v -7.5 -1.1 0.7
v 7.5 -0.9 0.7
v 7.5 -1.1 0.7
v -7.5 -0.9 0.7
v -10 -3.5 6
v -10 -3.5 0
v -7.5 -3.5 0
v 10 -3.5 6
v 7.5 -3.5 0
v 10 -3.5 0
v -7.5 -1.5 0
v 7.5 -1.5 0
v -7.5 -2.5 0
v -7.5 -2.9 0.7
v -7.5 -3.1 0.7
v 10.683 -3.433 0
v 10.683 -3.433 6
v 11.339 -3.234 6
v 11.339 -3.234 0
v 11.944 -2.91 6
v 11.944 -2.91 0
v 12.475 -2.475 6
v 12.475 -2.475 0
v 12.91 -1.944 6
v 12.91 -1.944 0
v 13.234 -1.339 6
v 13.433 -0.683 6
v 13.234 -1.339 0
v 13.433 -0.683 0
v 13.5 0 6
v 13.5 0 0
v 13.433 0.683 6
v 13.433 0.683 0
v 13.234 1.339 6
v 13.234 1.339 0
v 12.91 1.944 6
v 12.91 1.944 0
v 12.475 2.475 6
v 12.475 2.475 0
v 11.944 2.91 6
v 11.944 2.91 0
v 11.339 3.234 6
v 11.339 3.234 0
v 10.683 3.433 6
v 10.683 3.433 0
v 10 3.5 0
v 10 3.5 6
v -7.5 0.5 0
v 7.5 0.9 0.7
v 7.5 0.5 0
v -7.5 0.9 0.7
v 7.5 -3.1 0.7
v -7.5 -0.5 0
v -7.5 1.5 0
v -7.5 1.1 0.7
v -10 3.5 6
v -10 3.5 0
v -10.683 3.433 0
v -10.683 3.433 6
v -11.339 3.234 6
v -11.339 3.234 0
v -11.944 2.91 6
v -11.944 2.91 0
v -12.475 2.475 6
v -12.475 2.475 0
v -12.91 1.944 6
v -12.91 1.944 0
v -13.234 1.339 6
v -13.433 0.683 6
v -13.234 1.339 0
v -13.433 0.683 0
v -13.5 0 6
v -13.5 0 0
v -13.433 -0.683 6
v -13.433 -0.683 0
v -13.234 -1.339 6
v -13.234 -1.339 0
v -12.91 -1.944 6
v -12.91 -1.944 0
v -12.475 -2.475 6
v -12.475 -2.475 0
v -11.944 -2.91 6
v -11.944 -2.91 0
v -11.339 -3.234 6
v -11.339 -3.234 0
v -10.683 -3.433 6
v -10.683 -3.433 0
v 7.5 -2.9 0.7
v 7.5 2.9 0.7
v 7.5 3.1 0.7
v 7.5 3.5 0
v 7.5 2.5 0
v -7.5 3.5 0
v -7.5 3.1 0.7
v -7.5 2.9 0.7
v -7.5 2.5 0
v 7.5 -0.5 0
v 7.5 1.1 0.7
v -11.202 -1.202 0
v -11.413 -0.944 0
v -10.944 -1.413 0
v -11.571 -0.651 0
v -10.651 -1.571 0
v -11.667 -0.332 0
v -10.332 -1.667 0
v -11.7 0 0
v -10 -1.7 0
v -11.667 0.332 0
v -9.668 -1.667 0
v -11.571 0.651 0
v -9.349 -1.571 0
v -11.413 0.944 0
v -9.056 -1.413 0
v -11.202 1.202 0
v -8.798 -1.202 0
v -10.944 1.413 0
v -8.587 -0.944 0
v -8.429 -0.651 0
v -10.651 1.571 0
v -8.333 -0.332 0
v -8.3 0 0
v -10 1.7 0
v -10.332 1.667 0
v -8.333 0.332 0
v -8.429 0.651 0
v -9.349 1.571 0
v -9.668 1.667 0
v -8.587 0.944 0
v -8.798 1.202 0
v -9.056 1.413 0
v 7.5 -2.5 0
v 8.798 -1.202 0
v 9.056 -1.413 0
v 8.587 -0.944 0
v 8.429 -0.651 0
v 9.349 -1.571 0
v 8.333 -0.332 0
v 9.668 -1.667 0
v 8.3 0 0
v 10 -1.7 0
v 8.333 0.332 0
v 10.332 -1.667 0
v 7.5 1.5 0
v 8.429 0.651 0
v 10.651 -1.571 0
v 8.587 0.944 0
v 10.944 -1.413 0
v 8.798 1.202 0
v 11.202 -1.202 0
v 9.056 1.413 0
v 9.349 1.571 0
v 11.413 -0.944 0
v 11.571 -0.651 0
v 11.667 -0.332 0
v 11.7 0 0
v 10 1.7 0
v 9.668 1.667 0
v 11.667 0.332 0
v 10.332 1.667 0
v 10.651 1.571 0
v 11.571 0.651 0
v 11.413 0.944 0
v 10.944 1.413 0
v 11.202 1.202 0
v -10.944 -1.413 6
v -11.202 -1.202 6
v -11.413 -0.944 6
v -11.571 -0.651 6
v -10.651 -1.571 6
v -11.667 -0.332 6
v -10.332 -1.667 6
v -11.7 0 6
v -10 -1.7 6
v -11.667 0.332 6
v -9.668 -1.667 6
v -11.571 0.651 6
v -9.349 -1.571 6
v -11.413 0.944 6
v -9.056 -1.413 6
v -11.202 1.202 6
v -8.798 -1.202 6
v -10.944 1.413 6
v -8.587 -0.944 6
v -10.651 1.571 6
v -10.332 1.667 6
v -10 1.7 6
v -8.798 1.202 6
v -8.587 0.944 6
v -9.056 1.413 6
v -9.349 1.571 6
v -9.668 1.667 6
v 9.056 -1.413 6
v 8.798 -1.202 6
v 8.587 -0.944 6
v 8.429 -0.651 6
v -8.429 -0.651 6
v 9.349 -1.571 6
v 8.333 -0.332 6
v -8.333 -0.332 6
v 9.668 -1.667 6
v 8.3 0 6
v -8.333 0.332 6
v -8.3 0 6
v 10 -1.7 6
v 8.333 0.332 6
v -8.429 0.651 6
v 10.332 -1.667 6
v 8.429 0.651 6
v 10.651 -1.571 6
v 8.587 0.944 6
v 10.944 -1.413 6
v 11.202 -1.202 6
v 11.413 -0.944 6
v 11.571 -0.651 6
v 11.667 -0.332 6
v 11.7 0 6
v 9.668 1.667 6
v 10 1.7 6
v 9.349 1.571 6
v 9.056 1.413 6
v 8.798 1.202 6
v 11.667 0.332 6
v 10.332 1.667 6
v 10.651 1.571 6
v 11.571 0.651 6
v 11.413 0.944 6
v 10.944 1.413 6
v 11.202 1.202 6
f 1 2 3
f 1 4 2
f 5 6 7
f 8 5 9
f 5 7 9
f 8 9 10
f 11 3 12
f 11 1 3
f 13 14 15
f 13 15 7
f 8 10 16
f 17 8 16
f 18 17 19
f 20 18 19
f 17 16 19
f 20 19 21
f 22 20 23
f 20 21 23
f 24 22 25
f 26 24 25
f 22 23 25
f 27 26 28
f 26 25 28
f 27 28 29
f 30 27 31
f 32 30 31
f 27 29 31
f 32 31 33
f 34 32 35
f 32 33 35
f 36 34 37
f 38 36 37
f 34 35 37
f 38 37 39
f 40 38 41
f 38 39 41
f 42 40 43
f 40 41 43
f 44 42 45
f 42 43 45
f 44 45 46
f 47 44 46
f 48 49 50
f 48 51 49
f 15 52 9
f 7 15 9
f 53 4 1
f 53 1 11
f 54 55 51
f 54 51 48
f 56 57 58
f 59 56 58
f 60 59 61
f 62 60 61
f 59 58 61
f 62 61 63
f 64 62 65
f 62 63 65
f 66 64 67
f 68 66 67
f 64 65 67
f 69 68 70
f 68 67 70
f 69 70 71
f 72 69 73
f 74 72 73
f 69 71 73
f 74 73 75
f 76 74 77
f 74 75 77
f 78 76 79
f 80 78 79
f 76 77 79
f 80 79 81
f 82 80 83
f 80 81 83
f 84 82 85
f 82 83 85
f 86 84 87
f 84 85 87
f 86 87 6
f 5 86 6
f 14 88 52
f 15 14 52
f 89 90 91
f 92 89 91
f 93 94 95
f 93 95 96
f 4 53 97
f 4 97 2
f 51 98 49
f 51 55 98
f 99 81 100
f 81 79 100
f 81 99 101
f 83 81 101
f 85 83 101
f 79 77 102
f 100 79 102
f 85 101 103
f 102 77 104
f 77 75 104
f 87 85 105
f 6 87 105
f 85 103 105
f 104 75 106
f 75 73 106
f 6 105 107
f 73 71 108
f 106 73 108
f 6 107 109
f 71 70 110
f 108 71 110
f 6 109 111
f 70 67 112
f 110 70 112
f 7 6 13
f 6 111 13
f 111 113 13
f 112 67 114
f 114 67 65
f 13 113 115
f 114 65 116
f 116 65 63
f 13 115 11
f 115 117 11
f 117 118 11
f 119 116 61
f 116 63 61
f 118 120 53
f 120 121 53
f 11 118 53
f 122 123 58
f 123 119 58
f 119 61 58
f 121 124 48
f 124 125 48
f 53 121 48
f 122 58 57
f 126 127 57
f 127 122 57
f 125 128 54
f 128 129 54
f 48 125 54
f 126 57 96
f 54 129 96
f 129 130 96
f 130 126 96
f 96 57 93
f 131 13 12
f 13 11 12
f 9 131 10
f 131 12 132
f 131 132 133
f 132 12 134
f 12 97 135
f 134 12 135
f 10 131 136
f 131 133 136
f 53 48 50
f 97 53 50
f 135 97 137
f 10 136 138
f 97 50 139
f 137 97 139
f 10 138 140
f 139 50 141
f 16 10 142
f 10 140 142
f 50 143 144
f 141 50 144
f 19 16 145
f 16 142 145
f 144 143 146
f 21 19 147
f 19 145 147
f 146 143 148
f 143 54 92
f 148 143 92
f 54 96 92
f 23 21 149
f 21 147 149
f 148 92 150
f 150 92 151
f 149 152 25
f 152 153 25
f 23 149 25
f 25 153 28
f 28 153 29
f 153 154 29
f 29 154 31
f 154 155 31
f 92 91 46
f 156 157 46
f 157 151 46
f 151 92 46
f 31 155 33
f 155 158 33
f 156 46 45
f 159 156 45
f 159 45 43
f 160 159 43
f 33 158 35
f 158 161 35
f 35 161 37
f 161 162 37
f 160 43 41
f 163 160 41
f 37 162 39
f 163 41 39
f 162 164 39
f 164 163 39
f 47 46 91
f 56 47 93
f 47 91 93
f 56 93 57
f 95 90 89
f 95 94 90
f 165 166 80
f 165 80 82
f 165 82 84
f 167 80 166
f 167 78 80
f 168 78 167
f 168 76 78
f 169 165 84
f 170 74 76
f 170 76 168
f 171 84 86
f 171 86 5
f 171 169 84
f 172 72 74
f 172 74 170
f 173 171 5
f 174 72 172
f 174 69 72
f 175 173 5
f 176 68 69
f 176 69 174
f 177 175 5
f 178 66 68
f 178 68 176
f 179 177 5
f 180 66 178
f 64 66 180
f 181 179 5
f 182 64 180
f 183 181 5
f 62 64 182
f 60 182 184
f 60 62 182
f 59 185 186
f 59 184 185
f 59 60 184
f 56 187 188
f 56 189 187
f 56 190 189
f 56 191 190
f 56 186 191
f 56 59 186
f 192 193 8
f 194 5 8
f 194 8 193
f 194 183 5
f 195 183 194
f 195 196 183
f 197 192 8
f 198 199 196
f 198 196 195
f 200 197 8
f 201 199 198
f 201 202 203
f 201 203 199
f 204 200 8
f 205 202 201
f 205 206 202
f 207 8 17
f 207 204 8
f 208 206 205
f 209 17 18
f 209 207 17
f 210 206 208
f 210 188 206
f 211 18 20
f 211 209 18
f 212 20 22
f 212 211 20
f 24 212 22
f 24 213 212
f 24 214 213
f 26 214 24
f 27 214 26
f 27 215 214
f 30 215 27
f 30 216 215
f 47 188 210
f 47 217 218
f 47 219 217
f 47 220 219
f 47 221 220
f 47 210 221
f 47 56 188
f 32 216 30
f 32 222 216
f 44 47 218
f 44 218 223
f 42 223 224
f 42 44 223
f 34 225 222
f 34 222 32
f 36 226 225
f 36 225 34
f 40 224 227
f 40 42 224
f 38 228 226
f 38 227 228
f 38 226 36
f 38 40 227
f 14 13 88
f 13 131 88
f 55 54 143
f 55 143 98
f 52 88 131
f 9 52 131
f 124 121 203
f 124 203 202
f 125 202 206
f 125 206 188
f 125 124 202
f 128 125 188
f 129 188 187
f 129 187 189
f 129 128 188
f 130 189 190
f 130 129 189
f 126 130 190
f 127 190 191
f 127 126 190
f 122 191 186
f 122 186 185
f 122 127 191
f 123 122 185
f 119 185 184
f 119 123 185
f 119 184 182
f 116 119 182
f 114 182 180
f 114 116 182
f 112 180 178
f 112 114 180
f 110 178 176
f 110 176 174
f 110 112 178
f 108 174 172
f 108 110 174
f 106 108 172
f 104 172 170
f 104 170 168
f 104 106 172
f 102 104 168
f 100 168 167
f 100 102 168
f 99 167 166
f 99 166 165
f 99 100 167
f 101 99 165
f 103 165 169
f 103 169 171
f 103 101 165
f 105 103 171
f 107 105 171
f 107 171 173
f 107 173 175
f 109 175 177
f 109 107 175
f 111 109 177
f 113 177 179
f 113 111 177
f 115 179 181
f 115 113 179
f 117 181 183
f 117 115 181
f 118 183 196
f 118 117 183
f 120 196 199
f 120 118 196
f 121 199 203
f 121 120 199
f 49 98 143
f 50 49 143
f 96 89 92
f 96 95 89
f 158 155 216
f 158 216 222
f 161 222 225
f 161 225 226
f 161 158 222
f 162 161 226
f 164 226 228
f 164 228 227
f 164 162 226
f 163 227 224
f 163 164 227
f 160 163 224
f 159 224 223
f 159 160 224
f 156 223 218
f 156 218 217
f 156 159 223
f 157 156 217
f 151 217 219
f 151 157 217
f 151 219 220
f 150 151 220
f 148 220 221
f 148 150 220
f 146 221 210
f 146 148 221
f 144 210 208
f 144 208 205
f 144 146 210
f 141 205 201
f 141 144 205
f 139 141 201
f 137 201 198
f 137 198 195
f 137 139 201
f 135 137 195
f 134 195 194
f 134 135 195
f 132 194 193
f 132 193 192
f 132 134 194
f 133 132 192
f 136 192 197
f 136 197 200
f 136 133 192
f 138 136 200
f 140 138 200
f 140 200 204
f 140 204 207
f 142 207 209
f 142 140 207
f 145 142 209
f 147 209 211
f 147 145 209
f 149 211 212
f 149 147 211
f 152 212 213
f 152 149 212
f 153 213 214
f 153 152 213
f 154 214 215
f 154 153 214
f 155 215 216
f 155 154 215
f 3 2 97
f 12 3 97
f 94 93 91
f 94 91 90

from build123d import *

# Parameters (mm, degrees)
ESBO_O1_R                = 1.7
RESSALTO_EXTRUS_O1_DEPTH = 6
CORTE_EXTRUS_O1_DEPTH    = 7.5


with BuildPart() as part:
    # Esboço1 → Ressalto-extrusão1 (new body)
    with BuildSketch(Plane.XY):
        with BuildLine():
            Line((10, 3.5), (-10, 3.5))
            ThreePointArc((-10, 3.5), (-13.5, 0), (-10, -3.5))
            Line((-10, -3.5), (10, -3.5))
            ThreePointArc((10, -3.5), (13.5, 0), (10, 3.5))
        make_face()
        with Locations((-10, 0)):
            Circle(ESBO_O1_R, mode=Mode.SUBTRACT)
        with Locations((10, 0)):
            Circle(ESBO_O1_R, mode=Mode.SUBTRACT)
    extrude(amount=RESSALTO_EXTRUS_O1_DEPTH)

    # Esboço2 → Corte-extrusão1 (cut, symmetric)
    with BuildSketch(Plane(origin=(0, 0, 0), x_dir=(0, 0, -1), z_dir=(1, 0, 0))):
        Polygon((0, 3.5), (-0.7, 3.1), (-0.7, 2.9), (0, 2.5), align=None)
        Polygon((0, 1.5), (-0.7, 1.1), (-0.7, 0.9), (0, 0.5), align=None)
        Polygon((0, -0.5), (-0.7, -0.9), (-0.7, -1.1), (0, -1.5), align=None)
        Polygon((0, -2.5), (-0.7, -2.9), (-0.7, -3.1), (0, -3.5), align=None)
    extrude(amount=CORTE_EXTRUS_O1_DEPTH, both=True, mode=Mode.SUBTRACT)


solid = part.part
